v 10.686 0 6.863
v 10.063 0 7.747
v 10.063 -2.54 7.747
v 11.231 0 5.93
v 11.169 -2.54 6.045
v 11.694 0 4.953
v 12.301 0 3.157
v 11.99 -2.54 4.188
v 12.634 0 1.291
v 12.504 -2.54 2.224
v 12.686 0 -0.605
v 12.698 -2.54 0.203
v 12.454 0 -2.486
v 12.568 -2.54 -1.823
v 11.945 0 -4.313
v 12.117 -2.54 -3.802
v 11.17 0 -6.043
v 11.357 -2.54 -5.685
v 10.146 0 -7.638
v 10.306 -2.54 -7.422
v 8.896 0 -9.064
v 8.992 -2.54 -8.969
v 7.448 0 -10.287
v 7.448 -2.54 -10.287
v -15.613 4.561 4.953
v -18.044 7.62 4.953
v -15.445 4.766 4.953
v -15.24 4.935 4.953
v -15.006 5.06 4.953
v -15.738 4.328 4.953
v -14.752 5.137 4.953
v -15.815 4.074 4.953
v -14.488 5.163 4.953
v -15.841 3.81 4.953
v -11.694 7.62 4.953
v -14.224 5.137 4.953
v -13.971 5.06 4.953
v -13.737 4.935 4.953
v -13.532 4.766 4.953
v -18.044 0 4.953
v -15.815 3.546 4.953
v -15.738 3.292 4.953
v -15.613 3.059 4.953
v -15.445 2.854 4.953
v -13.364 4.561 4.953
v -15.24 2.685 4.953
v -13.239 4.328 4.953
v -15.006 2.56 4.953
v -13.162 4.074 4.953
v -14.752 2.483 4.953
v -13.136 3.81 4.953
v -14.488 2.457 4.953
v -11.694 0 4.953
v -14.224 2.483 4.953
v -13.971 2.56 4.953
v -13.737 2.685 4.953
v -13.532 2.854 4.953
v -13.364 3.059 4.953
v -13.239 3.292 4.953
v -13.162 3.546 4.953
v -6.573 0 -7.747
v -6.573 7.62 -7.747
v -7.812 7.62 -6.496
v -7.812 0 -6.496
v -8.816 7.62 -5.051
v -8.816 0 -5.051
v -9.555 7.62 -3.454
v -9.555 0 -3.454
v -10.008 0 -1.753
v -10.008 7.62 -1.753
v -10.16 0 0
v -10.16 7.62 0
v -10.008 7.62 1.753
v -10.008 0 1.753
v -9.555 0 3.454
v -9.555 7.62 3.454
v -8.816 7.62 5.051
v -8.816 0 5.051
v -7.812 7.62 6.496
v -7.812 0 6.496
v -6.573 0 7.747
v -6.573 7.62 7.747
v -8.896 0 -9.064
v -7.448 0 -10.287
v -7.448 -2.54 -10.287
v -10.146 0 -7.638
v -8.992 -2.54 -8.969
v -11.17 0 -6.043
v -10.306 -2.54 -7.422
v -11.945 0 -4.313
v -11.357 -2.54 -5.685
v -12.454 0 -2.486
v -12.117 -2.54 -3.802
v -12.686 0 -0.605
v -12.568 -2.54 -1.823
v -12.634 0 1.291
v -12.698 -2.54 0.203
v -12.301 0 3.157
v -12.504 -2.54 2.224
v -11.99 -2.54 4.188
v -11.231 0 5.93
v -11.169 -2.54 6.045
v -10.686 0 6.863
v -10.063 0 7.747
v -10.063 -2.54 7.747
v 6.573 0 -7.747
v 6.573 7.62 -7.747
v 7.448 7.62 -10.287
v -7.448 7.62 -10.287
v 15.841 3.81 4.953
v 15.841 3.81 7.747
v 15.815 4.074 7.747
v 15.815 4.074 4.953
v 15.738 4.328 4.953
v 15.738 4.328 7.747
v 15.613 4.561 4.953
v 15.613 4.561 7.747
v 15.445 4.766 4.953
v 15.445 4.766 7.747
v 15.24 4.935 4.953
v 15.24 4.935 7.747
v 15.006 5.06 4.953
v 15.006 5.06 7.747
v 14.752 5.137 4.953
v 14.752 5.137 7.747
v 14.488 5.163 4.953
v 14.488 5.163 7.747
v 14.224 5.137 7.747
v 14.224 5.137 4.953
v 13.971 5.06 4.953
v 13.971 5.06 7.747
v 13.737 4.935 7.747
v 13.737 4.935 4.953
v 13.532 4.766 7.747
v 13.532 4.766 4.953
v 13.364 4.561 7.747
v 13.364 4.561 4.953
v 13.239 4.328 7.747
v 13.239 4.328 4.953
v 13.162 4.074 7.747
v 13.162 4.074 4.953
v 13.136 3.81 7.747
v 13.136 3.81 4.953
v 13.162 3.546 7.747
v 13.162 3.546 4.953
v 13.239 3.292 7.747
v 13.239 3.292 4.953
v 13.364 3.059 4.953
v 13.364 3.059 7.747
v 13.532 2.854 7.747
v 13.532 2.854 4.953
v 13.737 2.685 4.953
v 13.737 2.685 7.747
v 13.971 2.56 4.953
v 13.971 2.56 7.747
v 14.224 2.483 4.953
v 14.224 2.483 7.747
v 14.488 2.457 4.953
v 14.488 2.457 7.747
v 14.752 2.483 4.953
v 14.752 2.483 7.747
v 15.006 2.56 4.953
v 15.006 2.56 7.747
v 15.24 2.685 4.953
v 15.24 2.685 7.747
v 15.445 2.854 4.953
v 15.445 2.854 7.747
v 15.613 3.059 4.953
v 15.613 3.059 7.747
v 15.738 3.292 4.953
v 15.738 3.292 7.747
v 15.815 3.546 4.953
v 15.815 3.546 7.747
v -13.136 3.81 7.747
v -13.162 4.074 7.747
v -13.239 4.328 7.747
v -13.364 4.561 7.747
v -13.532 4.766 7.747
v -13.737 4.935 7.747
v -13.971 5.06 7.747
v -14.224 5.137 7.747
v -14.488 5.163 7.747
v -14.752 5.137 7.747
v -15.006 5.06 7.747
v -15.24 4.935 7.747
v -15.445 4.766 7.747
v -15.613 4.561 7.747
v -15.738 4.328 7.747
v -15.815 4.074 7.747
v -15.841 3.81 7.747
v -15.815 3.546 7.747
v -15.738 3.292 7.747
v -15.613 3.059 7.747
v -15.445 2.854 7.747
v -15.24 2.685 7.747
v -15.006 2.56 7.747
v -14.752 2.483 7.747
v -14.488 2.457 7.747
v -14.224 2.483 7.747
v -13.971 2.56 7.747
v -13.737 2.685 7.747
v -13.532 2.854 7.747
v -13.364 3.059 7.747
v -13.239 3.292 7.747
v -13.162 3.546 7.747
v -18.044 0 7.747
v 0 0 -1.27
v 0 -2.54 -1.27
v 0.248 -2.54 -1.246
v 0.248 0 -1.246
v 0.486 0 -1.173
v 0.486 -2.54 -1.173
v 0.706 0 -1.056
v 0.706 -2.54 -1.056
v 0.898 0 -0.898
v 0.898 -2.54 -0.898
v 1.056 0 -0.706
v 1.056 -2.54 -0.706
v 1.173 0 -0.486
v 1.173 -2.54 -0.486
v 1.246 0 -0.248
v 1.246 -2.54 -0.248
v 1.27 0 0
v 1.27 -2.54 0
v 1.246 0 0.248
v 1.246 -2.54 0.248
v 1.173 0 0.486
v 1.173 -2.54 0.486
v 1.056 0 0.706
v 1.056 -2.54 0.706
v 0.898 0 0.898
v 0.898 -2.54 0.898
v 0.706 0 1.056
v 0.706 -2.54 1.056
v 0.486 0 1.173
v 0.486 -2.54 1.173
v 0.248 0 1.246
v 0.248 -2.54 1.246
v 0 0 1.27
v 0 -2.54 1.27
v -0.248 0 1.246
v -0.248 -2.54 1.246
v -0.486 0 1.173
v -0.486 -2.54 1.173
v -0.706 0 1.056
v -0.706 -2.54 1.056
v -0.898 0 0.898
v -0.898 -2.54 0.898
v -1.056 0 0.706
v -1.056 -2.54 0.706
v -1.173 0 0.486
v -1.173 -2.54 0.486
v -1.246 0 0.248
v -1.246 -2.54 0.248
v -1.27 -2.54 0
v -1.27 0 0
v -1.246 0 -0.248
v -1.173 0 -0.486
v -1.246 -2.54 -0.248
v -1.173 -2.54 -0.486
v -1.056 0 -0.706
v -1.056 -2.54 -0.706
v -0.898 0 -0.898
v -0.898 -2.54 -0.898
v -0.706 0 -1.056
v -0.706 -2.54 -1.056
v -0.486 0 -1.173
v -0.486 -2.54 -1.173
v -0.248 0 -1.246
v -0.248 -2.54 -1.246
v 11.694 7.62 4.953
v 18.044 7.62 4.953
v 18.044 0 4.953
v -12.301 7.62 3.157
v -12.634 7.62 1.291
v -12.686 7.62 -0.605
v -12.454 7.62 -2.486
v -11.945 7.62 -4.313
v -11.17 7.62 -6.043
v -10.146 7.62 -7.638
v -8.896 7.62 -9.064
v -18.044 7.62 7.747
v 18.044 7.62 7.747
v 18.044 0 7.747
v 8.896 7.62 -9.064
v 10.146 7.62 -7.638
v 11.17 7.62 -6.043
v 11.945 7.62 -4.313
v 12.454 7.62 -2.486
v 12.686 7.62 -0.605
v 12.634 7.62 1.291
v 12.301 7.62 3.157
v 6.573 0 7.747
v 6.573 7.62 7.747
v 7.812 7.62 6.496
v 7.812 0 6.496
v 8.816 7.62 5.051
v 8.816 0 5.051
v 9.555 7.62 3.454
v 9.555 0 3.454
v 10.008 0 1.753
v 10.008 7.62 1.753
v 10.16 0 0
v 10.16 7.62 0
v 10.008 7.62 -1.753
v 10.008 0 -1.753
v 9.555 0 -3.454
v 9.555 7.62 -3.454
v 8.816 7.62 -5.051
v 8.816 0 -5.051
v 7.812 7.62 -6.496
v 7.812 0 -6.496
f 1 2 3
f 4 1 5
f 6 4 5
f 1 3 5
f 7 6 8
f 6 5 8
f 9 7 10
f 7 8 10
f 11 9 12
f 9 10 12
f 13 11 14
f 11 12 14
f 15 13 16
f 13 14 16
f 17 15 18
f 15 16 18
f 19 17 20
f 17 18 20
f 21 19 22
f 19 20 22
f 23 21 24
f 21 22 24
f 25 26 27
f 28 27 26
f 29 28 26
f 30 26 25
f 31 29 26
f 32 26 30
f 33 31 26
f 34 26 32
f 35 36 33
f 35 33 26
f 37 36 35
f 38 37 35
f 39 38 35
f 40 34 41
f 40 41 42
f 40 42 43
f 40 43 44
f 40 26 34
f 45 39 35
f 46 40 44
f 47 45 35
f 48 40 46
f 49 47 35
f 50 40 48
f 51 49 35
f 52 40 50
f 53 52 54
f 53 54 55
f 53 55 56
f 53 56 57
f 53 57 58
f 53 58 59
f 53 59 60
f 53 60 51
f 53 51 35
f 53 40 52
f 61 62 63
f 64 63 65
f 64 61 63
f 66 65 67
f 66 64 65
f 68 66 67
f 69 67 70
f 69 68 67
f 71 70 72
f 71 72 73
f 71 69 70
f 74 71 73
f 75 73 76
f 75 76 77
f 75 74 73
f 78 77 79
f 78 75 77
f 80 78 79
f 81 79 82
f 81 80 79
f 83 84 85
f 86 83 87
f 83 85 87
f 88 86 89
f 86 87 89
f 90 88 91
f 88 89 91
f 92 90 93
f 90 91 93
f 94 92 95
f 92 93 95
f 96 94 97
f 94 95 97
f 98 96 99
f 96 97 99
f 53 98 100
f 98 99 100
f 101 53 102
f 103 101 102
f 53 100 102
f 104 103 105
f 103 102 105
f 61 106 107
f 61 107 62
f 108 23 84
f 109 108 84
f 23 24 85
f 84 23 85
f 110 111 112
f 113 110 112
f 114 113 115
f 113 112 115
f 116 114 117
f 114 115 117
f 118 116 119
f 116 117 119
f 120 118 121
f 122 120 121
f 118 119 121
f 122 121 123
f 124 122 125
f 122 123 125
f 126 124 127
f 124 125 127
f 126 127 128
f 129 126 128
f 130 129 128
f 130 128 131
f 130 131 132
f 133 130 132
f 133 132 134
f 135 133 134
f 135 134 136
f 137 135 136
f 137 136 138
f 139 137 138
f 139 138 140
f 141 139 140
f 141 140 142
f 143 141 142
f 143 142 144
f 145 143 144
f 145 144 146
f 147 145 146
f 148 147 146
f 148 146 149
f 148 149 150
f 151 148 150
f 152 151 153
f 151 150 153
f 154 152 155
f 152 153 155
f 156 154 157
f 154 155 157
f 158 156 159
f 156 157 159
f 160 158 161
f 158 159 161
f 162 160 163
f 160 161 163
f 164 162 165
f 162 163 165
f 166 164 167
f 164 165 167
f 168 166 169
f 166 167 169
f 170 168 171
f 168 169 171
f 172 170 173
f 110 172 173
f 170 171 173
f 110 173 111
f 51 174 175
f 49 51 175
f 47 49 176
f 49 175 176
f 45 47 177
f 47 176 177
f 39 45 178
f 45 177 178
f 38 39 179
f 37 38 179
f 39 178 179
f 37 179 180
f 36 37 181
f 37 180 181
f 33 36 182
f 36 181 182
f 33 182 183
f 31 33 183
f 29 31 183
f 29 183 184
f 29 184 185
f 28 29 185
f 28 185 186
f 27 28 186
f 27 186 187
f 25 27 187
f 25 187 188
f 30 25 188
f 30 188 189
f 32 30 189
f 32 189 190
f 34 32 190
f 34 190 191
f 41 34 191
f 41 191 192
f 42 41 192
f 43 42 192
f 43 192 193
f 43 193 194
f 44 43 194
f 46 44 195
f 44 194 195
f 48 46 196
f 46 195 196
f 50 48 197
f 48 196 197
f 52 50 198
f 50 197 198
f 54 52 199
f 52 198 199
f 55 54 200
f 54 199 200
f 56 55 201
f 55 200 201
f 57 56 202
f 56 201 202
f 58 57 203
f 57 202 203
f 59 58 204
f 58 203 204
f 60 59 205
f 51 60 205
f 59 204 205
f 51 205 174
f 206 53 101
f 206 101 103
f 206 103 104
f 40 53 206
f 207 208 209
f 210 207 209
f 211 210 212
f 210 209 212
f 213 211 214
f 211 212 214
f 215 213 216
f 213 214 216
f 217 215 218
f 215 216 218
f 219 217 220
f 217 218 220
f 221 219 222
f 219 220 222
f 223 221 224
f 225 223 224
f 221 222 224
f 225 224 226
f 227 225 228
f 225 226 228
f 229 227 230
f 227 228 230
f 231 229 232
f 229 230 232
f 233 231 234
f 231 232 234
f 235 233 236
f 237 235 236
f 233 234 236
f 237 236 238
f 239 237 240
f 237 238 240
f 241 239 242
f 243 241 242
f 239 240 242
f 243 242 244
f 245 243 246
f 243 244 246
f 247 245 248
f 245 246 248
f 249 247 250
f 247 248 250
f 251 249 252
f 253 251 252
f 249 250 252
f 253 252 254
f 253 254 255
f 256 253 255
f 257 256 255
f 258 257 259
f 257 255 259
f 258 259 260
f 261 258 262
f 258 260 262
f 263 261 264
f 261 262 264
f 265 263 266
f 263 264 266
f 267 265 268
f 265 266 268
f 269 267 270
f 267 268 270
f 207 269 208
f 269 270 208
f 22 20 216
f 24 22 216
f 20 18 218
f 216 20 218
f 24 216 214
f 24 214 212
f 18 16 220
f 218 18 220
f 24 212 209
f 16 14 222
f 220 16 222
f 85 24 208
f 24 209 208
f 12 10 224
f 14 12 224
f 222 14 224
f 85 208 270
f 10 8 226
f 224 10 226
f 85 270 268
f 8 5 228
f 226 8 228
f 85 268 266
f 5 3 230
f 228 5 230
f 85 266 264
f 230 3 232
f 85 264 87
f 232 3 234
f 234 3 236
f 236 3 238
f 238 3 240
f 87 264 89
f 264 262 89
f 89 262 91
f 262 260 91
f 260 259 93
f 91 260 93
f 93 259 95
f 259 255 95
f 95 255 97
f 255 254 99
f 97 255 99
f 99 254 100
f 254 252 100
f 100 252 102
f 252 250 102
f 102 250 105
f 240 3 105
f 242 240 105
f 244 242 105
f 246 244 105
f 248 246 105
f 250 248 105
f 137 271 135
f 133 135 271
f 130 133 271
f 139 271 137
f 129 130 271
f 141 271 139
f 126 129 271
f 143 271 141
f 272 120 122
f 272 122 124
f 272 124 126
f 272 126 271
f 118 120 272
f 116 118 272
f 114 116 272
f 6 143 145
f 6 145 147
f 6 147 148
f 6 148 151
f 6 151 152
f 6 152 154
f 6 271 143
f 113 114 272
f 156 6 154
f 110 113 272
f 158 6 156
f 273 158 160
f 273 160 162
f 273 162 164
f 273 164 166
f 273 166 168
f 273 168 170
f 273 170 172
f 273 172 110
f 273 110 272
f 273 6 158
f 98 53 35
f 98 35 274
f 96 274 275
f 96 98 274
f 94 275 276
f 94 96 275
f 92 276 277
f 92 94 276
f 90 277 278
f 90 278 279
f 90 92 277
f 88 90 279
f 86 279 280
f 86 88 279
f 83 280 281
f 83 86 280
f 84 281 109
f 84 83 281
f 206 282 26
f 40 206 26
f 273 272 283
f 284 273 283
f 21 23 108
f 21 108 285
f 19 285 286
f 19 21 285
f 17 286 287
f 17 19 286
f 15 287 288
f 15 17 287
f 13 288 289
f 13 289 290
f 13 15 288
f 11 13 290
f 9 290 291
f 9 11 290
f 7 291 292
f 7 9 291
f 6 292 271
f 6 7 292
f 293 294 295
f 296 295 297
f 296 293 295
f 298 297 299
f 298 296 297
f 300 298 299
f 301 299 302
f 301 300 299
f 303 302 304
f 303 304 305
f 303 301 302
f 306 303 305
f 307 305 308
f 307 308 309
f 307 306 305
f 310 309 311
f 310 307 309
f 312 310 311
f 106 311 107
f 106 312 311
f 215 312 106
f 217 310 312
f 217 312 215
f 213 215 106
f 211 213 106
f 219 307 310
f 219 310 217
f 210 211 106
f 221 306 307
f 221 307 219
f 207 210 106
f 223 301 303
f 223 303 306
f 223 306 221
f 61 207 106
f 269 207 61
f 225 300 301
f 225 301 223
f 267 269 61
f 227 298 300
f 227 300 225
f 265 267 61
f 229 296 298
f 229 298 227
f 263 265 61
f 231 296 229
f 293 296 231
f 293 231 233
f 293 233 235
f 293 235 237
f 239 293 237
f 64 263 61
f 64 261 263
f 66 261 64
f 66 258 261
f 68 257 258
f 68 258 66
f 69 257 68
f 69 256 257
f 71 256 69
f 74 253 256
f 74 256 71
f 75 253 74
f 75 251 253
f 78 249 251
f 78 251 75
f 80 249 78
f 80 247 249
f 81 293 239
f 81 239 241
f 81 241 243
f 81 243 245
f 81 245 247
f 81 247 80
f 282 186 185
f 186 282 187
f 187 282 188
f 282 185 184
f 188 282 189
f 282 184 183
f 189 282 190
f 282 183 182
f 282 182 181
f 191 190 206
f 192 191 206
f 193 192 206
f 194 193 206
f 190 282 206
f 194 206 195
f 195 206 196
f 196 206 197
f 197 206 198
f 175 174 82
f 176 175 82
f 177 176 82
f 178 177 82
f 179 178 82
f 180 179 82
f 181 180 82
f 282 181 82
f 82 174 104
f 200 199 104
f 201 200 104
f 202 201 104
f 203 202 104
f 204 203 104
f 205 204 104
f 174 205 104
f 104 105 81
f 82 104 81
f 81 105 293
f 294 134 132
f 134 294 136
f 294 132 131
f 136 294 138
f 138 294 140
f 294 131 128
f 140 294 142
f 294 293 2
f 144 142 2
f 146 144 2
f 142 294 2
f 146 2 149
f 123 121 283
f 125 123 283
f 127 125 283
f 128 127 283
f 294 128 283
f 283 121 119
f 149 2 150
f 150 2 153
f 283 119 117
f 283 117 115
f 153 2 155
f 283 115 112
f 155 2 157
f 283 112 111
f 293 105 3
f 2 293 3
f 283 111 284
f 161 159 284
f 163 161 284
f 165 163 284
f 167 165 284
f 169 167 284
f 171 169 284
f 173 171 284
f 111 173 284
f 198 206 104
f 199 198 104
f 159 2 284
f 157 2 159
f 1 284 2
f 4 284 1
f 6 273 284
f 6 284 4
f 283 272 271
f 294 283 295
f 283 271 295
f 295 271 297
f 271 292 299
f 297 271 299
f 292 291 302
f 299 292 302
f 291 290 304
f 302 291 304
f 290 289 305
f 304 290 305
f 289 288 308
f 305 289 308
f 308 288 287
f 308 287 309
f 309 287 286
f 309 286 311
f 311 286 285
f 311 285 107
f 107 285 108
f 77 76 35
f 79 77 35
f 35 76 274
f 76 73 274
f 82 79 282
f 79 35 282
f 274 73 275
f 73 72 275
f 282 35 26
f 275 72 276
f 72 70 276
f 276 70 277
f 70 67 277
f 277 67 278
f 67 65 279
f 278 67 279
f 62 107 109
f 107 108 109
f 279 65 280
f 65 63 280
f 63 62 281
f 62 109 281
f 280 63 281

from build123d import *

# Parameters (mm, degrees)
BOSS_EXTRUDE1_DEPTH           = 7.62
BOSS_EXTRUDE2_START           = 2.54
SKETCH3_R                     = 1.27
BOSS_EXTRUDE2_DEPTH           = 2.54
TAP_DRILL_FOR_6_32_TAP1_D     = 2.7051
TAP_DRILL_FOR_6_32_TAP1_DEPTH = 7.62
TAP_DRILL_FOR_6_32_TAP1_TIP   = 0.81269403


with BuildPart() as part:
    # Sketch2 → Boss-Extrude1 (new body)
    with BuildSketch(Plane(origin=(0, 0, 0), x_dir=(1, 0, 0), z_dir=(0, 1, 0))):
        with BuildLine():
            Line((-7.447659431, 10.287), (7.447659431, 10.287))
            ThreePointArc((7.447659431, 10.287), (12.233908558, 3.409029391), (11.694348678, -4.953))
            Line((11.694348678, -4.953), (18.044348678, -4.953))
            Line((18.044348678, -4.953), (18.044348678, -7.747))
            Line((18.044348678, -7.747), (10.063497951, -7.747))
            Line((10.063497951, -7.747), (6.573400262, -7.747))
            ThreePointArc((6.573400262, -7.747), (10.16, 0), (6.573400262, 7.747))
            Line((6.573400262, 7.747), (-6.573400262, 7.747))
            ThreePointArc((-6.573400262, 7.747), (-10.16, 0), (-6.573400262, -7.747))
            Line((-6.573400262, -7.747), (-10.063497951, -7.747))
            Line((-10.063497951, -7.747), (-18.044348678, -7.747))
            Line((-18.044348678, -7.747), (-18.044348678, -4.953))
            Line((-18.044348678, -4.953), (-11.694348678, -4.953))
            ThreePointArc((-11.694348678, -4.953), (-12.233908558, 3.409029391), (-7.447659431, 10.287))
        make_face()
    extrude(amount=BOSS_EXTRUDE1_DEPTH)

    # Sketch3 → Boss-Extrude2 (add)
    with BuildSketch(Plane.XZ.offset(BOSS_EXTRUDE2_START)):
        with BuildLine():
            Line((7.447659431, -10.287), (-7.447659431, -10.287))
            ThreePointArc((-7.447659431, -10.287), (-12.568470361, -1.823061379), (-10.063497951, 7.747))
            Line((-10.063497951, 7.747), (10.063497951, 7.747))
            ThreePointArc((10.063497951, 7.747), (12.568470361, -1.823061379), (7.447659431, -10.287))
        make_face()
        with Locations(Location((0, 0, 0), (0, 0, 270))):
            Circle(SKETCH3_R, mode=Mode.SUBTRACT)
    extrude(amount=-BOSS_EXTRUDE2_DEPTH)

    # Tap Drill for #6-32 Tap1
    with Locations(Plane(origin=(0, 0, 4.953), x_dir=(-1, 0, 0), z_dir=(0, 0, -1))):
        with Locations((-14.488348678, 3.81), (14.488348678, 3.81)):
            Hole(TAP_DRILL_FOR_6_32_TAP1_D / 2, depth=TAP_DRILL_FOR_6_32_TAP1_DEPTH)
            with Locations((0, 0, -(TAP_DRILL_FOR_6_32_TAP1_DEPTH + TAP_DRILL_FOR_6_32_TAP1_TIP / 2))):  # 118° drill point
                Cone(0, TAP_DRILL_FOR_6_32_TAP1_D / 2, TAP_DRILL_FOR_6_32_TAP1_TIP, mode=Mode.SUBTRACT)


solid = part.part
